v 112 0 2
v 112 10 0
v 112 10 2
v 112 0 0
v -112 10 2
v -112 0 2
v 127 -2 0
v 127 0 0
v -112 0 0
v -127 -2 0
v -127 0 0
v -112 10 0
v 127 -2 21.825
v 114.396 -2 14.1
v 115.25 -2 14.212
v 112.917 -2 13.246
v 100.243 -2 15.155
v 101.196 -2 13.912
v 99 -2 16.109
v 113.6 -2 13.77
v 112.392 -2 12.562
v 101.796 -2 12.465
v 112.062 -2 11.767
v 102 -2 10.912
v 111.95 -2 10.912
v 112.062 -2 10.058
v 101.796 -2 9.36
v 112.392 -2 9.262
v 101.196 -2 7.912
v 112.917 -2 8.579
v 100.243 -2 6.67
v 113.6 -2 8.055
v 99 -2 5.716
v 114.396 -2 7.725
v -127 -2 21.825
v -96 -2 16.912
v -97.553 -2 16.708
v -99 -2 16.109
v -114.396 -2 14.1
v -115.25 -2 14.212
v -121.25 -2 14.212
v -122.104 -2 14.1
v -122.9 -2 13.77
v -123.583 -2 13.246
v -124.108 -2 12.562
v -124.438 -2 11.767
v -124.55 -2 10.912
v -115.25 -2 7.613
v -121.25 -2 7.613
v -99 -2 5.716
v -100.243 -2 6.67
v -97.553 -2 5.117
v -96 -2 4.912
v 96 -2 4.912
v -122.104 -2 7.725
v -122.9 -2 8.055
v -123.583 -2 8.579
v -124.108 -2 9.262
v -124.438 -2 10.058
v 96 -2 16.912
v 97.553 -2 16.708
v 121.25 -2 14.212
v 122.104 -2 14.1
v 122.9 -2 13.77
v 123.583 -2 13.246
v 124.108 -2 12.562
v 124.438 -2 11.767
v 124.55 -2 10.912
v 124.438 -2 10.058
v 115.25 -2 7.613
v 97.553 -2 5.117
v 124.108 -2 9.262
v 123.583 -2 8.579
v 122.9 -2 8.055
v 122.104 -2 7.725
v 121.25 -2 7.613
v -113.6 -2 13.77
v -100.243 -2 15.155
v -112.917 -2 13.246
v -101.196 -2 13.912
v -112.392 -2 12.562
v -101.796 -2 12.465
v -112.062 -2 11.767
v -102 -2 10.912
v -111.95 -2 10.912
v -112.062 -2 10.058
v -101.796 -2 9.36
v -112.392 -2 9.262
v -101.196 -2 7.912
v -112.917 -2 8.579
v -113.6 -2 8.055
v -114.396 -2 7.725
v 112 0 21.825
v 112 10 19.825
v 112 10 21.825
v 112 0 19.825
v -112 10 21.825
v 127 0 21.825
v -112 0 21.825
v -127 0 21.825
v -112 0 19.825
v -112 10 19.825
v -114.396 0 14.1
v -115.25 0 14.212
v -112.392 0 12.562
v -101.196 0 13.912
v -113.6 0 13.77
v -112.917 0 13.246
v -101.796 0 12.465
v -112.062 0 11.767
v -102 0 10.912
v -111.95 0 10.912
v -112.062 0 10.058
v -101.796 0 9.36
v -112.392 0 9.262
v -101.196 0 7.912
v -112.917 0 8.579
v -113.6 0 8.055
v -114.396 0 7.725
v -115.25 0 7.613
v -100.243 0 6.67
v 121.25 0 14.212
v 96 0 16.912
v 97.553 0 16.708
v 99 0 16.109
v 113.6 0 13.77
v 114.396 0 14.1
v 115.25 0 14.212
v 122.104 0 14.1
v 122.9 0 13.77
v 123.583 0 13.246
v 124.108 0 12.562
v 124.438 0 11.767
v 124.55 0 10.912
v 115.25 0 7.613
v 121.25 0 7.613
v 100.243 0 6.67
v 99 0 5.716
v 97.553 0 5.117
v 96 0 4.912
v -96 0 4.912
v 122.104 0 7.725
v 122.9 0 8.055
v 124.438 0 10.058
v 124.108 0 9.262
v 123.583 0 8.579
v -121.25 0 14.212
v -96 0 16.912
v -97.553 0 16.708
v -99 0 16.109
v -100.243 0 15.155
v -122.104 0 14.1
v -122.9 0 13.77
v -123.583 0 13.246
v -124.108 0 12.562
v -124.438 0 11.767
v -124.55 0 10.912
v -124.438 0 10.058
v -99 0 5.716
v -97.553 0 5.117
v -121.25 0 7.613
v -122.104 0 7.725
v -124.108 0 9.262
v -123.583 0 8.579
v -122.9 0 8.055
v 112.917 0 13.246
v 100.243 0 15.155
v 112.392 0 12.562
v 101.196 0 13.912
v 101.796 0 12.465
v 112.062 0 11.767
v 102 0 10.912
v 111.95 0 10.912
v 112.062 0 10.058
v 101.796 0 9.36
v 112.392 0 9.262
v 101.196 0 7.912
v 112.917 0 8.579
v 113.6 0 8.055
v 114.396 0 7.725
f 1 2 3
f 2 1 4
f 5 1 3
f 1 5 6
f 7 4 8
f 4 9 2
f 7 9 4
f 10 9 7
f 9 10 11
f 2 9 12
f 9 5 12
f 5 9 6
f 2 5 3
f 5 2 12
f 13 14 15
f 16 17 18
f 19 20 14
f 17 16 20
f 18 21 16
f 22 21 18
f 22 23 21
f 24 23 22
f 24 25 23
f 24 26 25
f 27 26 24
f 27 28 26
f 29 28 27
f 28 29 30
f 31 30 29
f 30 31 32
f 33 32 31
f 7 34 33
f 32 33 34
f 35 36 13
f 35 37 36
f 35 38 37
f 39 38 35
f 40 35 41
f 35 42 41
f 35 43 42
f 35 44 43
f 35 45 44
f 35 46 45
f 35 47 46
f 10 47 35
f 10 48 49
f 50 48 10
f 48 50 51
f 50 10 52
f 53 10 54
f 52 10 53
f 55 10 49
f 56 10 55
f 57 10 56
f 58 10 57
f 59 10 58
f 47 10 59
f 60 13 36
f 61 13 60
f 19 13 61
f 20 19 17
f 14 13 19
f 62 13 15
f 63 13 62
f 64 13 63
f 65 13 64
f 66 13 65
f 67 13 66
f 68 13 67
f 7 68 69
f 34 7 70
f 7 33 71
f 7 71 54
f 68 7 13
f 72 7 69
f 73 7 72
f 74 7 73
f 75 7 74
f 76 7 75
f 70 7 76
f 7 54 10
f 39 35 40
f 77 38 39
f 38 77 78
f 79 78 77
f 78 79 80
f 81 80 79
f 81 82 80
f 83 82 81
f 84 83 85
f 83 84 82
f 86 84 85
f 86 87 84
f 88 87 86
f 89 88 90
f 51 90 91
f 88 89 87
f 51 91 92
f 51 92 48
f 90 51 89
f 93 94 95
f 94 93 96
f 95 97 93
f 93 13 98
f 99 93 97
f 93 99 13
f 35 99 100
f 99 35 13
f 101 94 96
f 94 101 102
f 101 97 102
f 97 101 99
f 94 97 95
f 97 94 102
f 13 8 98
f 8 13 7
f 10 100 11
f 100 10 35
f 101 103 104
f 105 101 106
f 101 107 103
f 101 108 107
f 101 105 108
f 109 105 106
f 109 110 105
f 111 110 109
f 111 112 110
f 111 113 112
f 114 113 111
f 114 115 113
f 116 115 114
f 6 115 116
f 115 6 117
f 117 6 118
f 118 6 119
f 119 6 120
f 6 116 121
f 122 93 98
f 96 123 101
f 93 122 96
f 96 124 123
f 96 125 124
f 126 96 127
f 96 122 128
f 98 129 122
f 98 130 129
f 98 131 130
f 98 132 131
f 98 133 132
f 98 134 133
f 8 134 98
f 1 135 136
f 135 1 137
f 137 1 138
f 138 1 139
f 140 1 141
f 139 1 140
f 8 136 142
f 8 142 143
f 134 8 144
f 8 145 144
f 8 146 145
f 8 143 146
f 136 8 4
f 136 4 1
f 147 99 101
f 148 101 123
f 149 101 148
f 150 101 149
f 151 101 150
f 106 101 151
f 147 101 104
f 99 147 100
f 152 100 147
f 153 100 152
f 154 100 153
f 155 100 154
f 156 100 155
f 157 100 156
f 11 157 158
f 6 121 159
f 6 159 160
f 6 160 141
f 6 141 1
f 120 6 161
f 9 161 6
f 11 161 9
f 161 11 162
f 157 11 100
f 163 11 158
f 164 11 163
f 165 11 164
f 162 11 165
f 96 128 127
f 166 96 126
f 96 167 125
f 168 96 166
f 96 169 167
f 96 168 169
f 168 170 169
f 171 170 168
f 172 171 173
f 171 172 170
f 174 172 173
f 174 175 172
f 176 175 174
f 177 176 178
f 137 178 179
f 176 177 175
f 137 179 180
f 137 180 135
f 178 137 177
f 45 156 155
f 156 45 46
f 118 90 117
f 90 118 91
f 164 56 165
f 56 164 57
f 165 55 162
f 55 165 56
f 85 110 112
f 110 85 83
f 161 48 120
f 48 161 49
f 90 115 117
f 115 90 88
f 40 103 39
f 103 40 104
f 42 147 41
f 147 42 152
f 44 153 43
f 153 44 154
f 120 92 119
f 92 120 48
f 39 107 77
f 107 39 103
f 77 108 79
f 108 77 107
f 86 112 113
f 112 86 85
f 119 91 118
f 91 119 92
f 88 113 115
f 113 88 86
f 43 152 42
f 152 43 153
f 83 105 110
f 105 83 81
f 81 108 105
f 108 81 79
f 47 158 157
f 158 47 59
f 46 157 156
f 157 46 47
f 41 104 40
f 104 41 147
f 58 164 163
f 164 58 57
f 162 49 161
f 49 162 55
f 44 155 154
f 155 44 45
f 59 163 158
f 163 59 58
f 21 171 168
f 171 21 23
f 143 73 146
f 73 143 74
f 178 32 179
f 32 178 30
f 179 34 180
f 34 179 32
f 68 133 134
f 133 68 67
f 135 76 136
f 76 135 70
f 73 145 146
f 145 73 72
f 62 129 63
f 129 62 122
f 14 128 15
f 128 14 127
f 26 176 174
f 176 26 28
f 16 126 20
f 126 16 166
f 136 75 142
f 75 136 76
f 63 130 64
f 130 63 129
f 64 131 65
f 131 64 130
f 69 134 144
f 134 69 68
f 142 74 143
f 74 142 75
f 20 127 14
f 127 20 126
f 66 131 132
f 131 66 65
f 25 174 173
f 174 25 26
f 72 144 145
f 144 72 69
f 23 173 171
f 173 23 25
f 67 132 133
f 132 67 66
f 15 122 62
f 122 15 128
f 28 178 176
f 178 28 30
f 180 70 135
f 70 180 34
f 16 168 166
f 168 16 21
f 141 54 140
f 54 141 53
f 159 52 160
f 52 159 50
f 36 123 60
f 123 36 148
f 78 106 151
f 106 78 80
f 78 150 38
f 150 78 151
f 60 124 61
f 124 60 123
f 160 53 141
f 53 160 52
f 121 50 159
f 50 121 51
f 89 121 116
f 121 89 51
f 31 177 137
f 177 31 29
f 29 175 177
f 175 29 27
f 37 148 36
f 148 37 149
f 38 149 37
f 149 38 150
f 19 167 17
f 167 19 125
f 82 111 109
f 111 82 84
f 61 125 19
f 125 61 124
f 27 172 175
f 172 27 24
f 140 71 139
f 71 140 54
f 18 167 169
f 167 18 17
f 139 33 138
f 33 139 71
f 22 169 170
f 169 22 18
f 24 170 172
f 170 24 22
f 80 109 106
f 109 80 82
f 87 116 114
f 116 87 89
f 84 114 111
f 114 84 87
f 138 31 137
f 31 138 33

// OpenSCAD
// Visual stand-in for a Tecmojo 0.5U cable-management brush panel (bought).
// A black half-height plate with rack ears and a long slot filled with
// two rows of bristles that meet in the middle, so cables can be pushed
// through anywhere along it.
// Rack coordinates: X across (0 = centre), Y rearward from the back face
// of the rack ears, Z up from the bottom of the half-U.
which = "panel";   // [panel, brush, cables]
$fn = 24;
U = 44.45;
h = U / 2 - 0.4;
t = 2;
slot = [204, 12];          // the brush opening
strand = [0.7, 6, 0.7];    // bristle tuft: width, depth (front to back), thickness
pitch = 1.5;               // tuft spacing along the slot
cable_x = [];              // gaps in the bristles for cables (none drawn)

module panel() {
    difference() {
        union() {
            translate([-127, -t, 0]) cube([254, t, h]);
            // folded lip along the top and bottom, behind the face
            for (z = [0, h - t]) translate([-112, -t, z]) cube([224, 12, t]);
        }
        // the slot, with rounded ends
        translate([0, 1, h / 2]) rotate([90, 0, 0])
            hull() for (s = [-1, 1]) translate([s * (slot[0] - slot[1]) / 2, 0, 0]) cylinder(d = slot[1], h = t + 2);
        for (s = [-1, 1]) translate([s * 118.25, 1, h / 2]) rotate([90, 0, 0])
            hull() for (dx = [-3, 3]) translate([dx, 0, 0]) cylinder(d = 6.6, h = t + 2);
    }
}

// Bristles: a dense comb of tufts from the top edge and another from the
// bottom edge, each reaching just past the middle so they overlap. Tufts
// are left out where a cable pushes through.
module brush() {
    half = slot[1] / 2;
    for (x = [-(slot[0] / 2 - half) : pitch : slot[0] / 2 - half])
        if (len(cable_x) == 0 || min([for (c = cable_x) abs(x - c)]) > 4)
            for (s = [-1, 1]) {
                // top row hangs down, bottom row stands up, staggered by half a pitch
                xx = x + (s > 0 ? 0 : pitch / 2);
                len = half + 0.8;
                translate([xx - strand[0] / 2, -t - 0.6, s > 0 ? h / 2 + half - len : h / 2 - half])
                    cube([strand[0], strand[1], len]);
            }
}

// cables pushed through the brush, running back into the rack
module cables() {
    for (i = [0 : len(cable_x) - 1]) {
        x = cable_x[i];
        hull() { translate([x, -14, h / 2 + 18]) sphere(d = 6); translate([x, -10, h / 2 + 6]) sphere(d = 6); }
        hull() { translate([x, -10, h / 2 + 6]) sphere(d = 6); translate([x, 6, h / 2]) sphere(d = 6); }
        hull() { translate([x, 6, h / 2]) sphere(d = 6); translate([x, 60 + i * 15, h / 2 - 4]) sphere(d = 6); }
    }
}

if (which == "panel") panel();
if (which == "brush") brush();
if (which == "cables") cables();
